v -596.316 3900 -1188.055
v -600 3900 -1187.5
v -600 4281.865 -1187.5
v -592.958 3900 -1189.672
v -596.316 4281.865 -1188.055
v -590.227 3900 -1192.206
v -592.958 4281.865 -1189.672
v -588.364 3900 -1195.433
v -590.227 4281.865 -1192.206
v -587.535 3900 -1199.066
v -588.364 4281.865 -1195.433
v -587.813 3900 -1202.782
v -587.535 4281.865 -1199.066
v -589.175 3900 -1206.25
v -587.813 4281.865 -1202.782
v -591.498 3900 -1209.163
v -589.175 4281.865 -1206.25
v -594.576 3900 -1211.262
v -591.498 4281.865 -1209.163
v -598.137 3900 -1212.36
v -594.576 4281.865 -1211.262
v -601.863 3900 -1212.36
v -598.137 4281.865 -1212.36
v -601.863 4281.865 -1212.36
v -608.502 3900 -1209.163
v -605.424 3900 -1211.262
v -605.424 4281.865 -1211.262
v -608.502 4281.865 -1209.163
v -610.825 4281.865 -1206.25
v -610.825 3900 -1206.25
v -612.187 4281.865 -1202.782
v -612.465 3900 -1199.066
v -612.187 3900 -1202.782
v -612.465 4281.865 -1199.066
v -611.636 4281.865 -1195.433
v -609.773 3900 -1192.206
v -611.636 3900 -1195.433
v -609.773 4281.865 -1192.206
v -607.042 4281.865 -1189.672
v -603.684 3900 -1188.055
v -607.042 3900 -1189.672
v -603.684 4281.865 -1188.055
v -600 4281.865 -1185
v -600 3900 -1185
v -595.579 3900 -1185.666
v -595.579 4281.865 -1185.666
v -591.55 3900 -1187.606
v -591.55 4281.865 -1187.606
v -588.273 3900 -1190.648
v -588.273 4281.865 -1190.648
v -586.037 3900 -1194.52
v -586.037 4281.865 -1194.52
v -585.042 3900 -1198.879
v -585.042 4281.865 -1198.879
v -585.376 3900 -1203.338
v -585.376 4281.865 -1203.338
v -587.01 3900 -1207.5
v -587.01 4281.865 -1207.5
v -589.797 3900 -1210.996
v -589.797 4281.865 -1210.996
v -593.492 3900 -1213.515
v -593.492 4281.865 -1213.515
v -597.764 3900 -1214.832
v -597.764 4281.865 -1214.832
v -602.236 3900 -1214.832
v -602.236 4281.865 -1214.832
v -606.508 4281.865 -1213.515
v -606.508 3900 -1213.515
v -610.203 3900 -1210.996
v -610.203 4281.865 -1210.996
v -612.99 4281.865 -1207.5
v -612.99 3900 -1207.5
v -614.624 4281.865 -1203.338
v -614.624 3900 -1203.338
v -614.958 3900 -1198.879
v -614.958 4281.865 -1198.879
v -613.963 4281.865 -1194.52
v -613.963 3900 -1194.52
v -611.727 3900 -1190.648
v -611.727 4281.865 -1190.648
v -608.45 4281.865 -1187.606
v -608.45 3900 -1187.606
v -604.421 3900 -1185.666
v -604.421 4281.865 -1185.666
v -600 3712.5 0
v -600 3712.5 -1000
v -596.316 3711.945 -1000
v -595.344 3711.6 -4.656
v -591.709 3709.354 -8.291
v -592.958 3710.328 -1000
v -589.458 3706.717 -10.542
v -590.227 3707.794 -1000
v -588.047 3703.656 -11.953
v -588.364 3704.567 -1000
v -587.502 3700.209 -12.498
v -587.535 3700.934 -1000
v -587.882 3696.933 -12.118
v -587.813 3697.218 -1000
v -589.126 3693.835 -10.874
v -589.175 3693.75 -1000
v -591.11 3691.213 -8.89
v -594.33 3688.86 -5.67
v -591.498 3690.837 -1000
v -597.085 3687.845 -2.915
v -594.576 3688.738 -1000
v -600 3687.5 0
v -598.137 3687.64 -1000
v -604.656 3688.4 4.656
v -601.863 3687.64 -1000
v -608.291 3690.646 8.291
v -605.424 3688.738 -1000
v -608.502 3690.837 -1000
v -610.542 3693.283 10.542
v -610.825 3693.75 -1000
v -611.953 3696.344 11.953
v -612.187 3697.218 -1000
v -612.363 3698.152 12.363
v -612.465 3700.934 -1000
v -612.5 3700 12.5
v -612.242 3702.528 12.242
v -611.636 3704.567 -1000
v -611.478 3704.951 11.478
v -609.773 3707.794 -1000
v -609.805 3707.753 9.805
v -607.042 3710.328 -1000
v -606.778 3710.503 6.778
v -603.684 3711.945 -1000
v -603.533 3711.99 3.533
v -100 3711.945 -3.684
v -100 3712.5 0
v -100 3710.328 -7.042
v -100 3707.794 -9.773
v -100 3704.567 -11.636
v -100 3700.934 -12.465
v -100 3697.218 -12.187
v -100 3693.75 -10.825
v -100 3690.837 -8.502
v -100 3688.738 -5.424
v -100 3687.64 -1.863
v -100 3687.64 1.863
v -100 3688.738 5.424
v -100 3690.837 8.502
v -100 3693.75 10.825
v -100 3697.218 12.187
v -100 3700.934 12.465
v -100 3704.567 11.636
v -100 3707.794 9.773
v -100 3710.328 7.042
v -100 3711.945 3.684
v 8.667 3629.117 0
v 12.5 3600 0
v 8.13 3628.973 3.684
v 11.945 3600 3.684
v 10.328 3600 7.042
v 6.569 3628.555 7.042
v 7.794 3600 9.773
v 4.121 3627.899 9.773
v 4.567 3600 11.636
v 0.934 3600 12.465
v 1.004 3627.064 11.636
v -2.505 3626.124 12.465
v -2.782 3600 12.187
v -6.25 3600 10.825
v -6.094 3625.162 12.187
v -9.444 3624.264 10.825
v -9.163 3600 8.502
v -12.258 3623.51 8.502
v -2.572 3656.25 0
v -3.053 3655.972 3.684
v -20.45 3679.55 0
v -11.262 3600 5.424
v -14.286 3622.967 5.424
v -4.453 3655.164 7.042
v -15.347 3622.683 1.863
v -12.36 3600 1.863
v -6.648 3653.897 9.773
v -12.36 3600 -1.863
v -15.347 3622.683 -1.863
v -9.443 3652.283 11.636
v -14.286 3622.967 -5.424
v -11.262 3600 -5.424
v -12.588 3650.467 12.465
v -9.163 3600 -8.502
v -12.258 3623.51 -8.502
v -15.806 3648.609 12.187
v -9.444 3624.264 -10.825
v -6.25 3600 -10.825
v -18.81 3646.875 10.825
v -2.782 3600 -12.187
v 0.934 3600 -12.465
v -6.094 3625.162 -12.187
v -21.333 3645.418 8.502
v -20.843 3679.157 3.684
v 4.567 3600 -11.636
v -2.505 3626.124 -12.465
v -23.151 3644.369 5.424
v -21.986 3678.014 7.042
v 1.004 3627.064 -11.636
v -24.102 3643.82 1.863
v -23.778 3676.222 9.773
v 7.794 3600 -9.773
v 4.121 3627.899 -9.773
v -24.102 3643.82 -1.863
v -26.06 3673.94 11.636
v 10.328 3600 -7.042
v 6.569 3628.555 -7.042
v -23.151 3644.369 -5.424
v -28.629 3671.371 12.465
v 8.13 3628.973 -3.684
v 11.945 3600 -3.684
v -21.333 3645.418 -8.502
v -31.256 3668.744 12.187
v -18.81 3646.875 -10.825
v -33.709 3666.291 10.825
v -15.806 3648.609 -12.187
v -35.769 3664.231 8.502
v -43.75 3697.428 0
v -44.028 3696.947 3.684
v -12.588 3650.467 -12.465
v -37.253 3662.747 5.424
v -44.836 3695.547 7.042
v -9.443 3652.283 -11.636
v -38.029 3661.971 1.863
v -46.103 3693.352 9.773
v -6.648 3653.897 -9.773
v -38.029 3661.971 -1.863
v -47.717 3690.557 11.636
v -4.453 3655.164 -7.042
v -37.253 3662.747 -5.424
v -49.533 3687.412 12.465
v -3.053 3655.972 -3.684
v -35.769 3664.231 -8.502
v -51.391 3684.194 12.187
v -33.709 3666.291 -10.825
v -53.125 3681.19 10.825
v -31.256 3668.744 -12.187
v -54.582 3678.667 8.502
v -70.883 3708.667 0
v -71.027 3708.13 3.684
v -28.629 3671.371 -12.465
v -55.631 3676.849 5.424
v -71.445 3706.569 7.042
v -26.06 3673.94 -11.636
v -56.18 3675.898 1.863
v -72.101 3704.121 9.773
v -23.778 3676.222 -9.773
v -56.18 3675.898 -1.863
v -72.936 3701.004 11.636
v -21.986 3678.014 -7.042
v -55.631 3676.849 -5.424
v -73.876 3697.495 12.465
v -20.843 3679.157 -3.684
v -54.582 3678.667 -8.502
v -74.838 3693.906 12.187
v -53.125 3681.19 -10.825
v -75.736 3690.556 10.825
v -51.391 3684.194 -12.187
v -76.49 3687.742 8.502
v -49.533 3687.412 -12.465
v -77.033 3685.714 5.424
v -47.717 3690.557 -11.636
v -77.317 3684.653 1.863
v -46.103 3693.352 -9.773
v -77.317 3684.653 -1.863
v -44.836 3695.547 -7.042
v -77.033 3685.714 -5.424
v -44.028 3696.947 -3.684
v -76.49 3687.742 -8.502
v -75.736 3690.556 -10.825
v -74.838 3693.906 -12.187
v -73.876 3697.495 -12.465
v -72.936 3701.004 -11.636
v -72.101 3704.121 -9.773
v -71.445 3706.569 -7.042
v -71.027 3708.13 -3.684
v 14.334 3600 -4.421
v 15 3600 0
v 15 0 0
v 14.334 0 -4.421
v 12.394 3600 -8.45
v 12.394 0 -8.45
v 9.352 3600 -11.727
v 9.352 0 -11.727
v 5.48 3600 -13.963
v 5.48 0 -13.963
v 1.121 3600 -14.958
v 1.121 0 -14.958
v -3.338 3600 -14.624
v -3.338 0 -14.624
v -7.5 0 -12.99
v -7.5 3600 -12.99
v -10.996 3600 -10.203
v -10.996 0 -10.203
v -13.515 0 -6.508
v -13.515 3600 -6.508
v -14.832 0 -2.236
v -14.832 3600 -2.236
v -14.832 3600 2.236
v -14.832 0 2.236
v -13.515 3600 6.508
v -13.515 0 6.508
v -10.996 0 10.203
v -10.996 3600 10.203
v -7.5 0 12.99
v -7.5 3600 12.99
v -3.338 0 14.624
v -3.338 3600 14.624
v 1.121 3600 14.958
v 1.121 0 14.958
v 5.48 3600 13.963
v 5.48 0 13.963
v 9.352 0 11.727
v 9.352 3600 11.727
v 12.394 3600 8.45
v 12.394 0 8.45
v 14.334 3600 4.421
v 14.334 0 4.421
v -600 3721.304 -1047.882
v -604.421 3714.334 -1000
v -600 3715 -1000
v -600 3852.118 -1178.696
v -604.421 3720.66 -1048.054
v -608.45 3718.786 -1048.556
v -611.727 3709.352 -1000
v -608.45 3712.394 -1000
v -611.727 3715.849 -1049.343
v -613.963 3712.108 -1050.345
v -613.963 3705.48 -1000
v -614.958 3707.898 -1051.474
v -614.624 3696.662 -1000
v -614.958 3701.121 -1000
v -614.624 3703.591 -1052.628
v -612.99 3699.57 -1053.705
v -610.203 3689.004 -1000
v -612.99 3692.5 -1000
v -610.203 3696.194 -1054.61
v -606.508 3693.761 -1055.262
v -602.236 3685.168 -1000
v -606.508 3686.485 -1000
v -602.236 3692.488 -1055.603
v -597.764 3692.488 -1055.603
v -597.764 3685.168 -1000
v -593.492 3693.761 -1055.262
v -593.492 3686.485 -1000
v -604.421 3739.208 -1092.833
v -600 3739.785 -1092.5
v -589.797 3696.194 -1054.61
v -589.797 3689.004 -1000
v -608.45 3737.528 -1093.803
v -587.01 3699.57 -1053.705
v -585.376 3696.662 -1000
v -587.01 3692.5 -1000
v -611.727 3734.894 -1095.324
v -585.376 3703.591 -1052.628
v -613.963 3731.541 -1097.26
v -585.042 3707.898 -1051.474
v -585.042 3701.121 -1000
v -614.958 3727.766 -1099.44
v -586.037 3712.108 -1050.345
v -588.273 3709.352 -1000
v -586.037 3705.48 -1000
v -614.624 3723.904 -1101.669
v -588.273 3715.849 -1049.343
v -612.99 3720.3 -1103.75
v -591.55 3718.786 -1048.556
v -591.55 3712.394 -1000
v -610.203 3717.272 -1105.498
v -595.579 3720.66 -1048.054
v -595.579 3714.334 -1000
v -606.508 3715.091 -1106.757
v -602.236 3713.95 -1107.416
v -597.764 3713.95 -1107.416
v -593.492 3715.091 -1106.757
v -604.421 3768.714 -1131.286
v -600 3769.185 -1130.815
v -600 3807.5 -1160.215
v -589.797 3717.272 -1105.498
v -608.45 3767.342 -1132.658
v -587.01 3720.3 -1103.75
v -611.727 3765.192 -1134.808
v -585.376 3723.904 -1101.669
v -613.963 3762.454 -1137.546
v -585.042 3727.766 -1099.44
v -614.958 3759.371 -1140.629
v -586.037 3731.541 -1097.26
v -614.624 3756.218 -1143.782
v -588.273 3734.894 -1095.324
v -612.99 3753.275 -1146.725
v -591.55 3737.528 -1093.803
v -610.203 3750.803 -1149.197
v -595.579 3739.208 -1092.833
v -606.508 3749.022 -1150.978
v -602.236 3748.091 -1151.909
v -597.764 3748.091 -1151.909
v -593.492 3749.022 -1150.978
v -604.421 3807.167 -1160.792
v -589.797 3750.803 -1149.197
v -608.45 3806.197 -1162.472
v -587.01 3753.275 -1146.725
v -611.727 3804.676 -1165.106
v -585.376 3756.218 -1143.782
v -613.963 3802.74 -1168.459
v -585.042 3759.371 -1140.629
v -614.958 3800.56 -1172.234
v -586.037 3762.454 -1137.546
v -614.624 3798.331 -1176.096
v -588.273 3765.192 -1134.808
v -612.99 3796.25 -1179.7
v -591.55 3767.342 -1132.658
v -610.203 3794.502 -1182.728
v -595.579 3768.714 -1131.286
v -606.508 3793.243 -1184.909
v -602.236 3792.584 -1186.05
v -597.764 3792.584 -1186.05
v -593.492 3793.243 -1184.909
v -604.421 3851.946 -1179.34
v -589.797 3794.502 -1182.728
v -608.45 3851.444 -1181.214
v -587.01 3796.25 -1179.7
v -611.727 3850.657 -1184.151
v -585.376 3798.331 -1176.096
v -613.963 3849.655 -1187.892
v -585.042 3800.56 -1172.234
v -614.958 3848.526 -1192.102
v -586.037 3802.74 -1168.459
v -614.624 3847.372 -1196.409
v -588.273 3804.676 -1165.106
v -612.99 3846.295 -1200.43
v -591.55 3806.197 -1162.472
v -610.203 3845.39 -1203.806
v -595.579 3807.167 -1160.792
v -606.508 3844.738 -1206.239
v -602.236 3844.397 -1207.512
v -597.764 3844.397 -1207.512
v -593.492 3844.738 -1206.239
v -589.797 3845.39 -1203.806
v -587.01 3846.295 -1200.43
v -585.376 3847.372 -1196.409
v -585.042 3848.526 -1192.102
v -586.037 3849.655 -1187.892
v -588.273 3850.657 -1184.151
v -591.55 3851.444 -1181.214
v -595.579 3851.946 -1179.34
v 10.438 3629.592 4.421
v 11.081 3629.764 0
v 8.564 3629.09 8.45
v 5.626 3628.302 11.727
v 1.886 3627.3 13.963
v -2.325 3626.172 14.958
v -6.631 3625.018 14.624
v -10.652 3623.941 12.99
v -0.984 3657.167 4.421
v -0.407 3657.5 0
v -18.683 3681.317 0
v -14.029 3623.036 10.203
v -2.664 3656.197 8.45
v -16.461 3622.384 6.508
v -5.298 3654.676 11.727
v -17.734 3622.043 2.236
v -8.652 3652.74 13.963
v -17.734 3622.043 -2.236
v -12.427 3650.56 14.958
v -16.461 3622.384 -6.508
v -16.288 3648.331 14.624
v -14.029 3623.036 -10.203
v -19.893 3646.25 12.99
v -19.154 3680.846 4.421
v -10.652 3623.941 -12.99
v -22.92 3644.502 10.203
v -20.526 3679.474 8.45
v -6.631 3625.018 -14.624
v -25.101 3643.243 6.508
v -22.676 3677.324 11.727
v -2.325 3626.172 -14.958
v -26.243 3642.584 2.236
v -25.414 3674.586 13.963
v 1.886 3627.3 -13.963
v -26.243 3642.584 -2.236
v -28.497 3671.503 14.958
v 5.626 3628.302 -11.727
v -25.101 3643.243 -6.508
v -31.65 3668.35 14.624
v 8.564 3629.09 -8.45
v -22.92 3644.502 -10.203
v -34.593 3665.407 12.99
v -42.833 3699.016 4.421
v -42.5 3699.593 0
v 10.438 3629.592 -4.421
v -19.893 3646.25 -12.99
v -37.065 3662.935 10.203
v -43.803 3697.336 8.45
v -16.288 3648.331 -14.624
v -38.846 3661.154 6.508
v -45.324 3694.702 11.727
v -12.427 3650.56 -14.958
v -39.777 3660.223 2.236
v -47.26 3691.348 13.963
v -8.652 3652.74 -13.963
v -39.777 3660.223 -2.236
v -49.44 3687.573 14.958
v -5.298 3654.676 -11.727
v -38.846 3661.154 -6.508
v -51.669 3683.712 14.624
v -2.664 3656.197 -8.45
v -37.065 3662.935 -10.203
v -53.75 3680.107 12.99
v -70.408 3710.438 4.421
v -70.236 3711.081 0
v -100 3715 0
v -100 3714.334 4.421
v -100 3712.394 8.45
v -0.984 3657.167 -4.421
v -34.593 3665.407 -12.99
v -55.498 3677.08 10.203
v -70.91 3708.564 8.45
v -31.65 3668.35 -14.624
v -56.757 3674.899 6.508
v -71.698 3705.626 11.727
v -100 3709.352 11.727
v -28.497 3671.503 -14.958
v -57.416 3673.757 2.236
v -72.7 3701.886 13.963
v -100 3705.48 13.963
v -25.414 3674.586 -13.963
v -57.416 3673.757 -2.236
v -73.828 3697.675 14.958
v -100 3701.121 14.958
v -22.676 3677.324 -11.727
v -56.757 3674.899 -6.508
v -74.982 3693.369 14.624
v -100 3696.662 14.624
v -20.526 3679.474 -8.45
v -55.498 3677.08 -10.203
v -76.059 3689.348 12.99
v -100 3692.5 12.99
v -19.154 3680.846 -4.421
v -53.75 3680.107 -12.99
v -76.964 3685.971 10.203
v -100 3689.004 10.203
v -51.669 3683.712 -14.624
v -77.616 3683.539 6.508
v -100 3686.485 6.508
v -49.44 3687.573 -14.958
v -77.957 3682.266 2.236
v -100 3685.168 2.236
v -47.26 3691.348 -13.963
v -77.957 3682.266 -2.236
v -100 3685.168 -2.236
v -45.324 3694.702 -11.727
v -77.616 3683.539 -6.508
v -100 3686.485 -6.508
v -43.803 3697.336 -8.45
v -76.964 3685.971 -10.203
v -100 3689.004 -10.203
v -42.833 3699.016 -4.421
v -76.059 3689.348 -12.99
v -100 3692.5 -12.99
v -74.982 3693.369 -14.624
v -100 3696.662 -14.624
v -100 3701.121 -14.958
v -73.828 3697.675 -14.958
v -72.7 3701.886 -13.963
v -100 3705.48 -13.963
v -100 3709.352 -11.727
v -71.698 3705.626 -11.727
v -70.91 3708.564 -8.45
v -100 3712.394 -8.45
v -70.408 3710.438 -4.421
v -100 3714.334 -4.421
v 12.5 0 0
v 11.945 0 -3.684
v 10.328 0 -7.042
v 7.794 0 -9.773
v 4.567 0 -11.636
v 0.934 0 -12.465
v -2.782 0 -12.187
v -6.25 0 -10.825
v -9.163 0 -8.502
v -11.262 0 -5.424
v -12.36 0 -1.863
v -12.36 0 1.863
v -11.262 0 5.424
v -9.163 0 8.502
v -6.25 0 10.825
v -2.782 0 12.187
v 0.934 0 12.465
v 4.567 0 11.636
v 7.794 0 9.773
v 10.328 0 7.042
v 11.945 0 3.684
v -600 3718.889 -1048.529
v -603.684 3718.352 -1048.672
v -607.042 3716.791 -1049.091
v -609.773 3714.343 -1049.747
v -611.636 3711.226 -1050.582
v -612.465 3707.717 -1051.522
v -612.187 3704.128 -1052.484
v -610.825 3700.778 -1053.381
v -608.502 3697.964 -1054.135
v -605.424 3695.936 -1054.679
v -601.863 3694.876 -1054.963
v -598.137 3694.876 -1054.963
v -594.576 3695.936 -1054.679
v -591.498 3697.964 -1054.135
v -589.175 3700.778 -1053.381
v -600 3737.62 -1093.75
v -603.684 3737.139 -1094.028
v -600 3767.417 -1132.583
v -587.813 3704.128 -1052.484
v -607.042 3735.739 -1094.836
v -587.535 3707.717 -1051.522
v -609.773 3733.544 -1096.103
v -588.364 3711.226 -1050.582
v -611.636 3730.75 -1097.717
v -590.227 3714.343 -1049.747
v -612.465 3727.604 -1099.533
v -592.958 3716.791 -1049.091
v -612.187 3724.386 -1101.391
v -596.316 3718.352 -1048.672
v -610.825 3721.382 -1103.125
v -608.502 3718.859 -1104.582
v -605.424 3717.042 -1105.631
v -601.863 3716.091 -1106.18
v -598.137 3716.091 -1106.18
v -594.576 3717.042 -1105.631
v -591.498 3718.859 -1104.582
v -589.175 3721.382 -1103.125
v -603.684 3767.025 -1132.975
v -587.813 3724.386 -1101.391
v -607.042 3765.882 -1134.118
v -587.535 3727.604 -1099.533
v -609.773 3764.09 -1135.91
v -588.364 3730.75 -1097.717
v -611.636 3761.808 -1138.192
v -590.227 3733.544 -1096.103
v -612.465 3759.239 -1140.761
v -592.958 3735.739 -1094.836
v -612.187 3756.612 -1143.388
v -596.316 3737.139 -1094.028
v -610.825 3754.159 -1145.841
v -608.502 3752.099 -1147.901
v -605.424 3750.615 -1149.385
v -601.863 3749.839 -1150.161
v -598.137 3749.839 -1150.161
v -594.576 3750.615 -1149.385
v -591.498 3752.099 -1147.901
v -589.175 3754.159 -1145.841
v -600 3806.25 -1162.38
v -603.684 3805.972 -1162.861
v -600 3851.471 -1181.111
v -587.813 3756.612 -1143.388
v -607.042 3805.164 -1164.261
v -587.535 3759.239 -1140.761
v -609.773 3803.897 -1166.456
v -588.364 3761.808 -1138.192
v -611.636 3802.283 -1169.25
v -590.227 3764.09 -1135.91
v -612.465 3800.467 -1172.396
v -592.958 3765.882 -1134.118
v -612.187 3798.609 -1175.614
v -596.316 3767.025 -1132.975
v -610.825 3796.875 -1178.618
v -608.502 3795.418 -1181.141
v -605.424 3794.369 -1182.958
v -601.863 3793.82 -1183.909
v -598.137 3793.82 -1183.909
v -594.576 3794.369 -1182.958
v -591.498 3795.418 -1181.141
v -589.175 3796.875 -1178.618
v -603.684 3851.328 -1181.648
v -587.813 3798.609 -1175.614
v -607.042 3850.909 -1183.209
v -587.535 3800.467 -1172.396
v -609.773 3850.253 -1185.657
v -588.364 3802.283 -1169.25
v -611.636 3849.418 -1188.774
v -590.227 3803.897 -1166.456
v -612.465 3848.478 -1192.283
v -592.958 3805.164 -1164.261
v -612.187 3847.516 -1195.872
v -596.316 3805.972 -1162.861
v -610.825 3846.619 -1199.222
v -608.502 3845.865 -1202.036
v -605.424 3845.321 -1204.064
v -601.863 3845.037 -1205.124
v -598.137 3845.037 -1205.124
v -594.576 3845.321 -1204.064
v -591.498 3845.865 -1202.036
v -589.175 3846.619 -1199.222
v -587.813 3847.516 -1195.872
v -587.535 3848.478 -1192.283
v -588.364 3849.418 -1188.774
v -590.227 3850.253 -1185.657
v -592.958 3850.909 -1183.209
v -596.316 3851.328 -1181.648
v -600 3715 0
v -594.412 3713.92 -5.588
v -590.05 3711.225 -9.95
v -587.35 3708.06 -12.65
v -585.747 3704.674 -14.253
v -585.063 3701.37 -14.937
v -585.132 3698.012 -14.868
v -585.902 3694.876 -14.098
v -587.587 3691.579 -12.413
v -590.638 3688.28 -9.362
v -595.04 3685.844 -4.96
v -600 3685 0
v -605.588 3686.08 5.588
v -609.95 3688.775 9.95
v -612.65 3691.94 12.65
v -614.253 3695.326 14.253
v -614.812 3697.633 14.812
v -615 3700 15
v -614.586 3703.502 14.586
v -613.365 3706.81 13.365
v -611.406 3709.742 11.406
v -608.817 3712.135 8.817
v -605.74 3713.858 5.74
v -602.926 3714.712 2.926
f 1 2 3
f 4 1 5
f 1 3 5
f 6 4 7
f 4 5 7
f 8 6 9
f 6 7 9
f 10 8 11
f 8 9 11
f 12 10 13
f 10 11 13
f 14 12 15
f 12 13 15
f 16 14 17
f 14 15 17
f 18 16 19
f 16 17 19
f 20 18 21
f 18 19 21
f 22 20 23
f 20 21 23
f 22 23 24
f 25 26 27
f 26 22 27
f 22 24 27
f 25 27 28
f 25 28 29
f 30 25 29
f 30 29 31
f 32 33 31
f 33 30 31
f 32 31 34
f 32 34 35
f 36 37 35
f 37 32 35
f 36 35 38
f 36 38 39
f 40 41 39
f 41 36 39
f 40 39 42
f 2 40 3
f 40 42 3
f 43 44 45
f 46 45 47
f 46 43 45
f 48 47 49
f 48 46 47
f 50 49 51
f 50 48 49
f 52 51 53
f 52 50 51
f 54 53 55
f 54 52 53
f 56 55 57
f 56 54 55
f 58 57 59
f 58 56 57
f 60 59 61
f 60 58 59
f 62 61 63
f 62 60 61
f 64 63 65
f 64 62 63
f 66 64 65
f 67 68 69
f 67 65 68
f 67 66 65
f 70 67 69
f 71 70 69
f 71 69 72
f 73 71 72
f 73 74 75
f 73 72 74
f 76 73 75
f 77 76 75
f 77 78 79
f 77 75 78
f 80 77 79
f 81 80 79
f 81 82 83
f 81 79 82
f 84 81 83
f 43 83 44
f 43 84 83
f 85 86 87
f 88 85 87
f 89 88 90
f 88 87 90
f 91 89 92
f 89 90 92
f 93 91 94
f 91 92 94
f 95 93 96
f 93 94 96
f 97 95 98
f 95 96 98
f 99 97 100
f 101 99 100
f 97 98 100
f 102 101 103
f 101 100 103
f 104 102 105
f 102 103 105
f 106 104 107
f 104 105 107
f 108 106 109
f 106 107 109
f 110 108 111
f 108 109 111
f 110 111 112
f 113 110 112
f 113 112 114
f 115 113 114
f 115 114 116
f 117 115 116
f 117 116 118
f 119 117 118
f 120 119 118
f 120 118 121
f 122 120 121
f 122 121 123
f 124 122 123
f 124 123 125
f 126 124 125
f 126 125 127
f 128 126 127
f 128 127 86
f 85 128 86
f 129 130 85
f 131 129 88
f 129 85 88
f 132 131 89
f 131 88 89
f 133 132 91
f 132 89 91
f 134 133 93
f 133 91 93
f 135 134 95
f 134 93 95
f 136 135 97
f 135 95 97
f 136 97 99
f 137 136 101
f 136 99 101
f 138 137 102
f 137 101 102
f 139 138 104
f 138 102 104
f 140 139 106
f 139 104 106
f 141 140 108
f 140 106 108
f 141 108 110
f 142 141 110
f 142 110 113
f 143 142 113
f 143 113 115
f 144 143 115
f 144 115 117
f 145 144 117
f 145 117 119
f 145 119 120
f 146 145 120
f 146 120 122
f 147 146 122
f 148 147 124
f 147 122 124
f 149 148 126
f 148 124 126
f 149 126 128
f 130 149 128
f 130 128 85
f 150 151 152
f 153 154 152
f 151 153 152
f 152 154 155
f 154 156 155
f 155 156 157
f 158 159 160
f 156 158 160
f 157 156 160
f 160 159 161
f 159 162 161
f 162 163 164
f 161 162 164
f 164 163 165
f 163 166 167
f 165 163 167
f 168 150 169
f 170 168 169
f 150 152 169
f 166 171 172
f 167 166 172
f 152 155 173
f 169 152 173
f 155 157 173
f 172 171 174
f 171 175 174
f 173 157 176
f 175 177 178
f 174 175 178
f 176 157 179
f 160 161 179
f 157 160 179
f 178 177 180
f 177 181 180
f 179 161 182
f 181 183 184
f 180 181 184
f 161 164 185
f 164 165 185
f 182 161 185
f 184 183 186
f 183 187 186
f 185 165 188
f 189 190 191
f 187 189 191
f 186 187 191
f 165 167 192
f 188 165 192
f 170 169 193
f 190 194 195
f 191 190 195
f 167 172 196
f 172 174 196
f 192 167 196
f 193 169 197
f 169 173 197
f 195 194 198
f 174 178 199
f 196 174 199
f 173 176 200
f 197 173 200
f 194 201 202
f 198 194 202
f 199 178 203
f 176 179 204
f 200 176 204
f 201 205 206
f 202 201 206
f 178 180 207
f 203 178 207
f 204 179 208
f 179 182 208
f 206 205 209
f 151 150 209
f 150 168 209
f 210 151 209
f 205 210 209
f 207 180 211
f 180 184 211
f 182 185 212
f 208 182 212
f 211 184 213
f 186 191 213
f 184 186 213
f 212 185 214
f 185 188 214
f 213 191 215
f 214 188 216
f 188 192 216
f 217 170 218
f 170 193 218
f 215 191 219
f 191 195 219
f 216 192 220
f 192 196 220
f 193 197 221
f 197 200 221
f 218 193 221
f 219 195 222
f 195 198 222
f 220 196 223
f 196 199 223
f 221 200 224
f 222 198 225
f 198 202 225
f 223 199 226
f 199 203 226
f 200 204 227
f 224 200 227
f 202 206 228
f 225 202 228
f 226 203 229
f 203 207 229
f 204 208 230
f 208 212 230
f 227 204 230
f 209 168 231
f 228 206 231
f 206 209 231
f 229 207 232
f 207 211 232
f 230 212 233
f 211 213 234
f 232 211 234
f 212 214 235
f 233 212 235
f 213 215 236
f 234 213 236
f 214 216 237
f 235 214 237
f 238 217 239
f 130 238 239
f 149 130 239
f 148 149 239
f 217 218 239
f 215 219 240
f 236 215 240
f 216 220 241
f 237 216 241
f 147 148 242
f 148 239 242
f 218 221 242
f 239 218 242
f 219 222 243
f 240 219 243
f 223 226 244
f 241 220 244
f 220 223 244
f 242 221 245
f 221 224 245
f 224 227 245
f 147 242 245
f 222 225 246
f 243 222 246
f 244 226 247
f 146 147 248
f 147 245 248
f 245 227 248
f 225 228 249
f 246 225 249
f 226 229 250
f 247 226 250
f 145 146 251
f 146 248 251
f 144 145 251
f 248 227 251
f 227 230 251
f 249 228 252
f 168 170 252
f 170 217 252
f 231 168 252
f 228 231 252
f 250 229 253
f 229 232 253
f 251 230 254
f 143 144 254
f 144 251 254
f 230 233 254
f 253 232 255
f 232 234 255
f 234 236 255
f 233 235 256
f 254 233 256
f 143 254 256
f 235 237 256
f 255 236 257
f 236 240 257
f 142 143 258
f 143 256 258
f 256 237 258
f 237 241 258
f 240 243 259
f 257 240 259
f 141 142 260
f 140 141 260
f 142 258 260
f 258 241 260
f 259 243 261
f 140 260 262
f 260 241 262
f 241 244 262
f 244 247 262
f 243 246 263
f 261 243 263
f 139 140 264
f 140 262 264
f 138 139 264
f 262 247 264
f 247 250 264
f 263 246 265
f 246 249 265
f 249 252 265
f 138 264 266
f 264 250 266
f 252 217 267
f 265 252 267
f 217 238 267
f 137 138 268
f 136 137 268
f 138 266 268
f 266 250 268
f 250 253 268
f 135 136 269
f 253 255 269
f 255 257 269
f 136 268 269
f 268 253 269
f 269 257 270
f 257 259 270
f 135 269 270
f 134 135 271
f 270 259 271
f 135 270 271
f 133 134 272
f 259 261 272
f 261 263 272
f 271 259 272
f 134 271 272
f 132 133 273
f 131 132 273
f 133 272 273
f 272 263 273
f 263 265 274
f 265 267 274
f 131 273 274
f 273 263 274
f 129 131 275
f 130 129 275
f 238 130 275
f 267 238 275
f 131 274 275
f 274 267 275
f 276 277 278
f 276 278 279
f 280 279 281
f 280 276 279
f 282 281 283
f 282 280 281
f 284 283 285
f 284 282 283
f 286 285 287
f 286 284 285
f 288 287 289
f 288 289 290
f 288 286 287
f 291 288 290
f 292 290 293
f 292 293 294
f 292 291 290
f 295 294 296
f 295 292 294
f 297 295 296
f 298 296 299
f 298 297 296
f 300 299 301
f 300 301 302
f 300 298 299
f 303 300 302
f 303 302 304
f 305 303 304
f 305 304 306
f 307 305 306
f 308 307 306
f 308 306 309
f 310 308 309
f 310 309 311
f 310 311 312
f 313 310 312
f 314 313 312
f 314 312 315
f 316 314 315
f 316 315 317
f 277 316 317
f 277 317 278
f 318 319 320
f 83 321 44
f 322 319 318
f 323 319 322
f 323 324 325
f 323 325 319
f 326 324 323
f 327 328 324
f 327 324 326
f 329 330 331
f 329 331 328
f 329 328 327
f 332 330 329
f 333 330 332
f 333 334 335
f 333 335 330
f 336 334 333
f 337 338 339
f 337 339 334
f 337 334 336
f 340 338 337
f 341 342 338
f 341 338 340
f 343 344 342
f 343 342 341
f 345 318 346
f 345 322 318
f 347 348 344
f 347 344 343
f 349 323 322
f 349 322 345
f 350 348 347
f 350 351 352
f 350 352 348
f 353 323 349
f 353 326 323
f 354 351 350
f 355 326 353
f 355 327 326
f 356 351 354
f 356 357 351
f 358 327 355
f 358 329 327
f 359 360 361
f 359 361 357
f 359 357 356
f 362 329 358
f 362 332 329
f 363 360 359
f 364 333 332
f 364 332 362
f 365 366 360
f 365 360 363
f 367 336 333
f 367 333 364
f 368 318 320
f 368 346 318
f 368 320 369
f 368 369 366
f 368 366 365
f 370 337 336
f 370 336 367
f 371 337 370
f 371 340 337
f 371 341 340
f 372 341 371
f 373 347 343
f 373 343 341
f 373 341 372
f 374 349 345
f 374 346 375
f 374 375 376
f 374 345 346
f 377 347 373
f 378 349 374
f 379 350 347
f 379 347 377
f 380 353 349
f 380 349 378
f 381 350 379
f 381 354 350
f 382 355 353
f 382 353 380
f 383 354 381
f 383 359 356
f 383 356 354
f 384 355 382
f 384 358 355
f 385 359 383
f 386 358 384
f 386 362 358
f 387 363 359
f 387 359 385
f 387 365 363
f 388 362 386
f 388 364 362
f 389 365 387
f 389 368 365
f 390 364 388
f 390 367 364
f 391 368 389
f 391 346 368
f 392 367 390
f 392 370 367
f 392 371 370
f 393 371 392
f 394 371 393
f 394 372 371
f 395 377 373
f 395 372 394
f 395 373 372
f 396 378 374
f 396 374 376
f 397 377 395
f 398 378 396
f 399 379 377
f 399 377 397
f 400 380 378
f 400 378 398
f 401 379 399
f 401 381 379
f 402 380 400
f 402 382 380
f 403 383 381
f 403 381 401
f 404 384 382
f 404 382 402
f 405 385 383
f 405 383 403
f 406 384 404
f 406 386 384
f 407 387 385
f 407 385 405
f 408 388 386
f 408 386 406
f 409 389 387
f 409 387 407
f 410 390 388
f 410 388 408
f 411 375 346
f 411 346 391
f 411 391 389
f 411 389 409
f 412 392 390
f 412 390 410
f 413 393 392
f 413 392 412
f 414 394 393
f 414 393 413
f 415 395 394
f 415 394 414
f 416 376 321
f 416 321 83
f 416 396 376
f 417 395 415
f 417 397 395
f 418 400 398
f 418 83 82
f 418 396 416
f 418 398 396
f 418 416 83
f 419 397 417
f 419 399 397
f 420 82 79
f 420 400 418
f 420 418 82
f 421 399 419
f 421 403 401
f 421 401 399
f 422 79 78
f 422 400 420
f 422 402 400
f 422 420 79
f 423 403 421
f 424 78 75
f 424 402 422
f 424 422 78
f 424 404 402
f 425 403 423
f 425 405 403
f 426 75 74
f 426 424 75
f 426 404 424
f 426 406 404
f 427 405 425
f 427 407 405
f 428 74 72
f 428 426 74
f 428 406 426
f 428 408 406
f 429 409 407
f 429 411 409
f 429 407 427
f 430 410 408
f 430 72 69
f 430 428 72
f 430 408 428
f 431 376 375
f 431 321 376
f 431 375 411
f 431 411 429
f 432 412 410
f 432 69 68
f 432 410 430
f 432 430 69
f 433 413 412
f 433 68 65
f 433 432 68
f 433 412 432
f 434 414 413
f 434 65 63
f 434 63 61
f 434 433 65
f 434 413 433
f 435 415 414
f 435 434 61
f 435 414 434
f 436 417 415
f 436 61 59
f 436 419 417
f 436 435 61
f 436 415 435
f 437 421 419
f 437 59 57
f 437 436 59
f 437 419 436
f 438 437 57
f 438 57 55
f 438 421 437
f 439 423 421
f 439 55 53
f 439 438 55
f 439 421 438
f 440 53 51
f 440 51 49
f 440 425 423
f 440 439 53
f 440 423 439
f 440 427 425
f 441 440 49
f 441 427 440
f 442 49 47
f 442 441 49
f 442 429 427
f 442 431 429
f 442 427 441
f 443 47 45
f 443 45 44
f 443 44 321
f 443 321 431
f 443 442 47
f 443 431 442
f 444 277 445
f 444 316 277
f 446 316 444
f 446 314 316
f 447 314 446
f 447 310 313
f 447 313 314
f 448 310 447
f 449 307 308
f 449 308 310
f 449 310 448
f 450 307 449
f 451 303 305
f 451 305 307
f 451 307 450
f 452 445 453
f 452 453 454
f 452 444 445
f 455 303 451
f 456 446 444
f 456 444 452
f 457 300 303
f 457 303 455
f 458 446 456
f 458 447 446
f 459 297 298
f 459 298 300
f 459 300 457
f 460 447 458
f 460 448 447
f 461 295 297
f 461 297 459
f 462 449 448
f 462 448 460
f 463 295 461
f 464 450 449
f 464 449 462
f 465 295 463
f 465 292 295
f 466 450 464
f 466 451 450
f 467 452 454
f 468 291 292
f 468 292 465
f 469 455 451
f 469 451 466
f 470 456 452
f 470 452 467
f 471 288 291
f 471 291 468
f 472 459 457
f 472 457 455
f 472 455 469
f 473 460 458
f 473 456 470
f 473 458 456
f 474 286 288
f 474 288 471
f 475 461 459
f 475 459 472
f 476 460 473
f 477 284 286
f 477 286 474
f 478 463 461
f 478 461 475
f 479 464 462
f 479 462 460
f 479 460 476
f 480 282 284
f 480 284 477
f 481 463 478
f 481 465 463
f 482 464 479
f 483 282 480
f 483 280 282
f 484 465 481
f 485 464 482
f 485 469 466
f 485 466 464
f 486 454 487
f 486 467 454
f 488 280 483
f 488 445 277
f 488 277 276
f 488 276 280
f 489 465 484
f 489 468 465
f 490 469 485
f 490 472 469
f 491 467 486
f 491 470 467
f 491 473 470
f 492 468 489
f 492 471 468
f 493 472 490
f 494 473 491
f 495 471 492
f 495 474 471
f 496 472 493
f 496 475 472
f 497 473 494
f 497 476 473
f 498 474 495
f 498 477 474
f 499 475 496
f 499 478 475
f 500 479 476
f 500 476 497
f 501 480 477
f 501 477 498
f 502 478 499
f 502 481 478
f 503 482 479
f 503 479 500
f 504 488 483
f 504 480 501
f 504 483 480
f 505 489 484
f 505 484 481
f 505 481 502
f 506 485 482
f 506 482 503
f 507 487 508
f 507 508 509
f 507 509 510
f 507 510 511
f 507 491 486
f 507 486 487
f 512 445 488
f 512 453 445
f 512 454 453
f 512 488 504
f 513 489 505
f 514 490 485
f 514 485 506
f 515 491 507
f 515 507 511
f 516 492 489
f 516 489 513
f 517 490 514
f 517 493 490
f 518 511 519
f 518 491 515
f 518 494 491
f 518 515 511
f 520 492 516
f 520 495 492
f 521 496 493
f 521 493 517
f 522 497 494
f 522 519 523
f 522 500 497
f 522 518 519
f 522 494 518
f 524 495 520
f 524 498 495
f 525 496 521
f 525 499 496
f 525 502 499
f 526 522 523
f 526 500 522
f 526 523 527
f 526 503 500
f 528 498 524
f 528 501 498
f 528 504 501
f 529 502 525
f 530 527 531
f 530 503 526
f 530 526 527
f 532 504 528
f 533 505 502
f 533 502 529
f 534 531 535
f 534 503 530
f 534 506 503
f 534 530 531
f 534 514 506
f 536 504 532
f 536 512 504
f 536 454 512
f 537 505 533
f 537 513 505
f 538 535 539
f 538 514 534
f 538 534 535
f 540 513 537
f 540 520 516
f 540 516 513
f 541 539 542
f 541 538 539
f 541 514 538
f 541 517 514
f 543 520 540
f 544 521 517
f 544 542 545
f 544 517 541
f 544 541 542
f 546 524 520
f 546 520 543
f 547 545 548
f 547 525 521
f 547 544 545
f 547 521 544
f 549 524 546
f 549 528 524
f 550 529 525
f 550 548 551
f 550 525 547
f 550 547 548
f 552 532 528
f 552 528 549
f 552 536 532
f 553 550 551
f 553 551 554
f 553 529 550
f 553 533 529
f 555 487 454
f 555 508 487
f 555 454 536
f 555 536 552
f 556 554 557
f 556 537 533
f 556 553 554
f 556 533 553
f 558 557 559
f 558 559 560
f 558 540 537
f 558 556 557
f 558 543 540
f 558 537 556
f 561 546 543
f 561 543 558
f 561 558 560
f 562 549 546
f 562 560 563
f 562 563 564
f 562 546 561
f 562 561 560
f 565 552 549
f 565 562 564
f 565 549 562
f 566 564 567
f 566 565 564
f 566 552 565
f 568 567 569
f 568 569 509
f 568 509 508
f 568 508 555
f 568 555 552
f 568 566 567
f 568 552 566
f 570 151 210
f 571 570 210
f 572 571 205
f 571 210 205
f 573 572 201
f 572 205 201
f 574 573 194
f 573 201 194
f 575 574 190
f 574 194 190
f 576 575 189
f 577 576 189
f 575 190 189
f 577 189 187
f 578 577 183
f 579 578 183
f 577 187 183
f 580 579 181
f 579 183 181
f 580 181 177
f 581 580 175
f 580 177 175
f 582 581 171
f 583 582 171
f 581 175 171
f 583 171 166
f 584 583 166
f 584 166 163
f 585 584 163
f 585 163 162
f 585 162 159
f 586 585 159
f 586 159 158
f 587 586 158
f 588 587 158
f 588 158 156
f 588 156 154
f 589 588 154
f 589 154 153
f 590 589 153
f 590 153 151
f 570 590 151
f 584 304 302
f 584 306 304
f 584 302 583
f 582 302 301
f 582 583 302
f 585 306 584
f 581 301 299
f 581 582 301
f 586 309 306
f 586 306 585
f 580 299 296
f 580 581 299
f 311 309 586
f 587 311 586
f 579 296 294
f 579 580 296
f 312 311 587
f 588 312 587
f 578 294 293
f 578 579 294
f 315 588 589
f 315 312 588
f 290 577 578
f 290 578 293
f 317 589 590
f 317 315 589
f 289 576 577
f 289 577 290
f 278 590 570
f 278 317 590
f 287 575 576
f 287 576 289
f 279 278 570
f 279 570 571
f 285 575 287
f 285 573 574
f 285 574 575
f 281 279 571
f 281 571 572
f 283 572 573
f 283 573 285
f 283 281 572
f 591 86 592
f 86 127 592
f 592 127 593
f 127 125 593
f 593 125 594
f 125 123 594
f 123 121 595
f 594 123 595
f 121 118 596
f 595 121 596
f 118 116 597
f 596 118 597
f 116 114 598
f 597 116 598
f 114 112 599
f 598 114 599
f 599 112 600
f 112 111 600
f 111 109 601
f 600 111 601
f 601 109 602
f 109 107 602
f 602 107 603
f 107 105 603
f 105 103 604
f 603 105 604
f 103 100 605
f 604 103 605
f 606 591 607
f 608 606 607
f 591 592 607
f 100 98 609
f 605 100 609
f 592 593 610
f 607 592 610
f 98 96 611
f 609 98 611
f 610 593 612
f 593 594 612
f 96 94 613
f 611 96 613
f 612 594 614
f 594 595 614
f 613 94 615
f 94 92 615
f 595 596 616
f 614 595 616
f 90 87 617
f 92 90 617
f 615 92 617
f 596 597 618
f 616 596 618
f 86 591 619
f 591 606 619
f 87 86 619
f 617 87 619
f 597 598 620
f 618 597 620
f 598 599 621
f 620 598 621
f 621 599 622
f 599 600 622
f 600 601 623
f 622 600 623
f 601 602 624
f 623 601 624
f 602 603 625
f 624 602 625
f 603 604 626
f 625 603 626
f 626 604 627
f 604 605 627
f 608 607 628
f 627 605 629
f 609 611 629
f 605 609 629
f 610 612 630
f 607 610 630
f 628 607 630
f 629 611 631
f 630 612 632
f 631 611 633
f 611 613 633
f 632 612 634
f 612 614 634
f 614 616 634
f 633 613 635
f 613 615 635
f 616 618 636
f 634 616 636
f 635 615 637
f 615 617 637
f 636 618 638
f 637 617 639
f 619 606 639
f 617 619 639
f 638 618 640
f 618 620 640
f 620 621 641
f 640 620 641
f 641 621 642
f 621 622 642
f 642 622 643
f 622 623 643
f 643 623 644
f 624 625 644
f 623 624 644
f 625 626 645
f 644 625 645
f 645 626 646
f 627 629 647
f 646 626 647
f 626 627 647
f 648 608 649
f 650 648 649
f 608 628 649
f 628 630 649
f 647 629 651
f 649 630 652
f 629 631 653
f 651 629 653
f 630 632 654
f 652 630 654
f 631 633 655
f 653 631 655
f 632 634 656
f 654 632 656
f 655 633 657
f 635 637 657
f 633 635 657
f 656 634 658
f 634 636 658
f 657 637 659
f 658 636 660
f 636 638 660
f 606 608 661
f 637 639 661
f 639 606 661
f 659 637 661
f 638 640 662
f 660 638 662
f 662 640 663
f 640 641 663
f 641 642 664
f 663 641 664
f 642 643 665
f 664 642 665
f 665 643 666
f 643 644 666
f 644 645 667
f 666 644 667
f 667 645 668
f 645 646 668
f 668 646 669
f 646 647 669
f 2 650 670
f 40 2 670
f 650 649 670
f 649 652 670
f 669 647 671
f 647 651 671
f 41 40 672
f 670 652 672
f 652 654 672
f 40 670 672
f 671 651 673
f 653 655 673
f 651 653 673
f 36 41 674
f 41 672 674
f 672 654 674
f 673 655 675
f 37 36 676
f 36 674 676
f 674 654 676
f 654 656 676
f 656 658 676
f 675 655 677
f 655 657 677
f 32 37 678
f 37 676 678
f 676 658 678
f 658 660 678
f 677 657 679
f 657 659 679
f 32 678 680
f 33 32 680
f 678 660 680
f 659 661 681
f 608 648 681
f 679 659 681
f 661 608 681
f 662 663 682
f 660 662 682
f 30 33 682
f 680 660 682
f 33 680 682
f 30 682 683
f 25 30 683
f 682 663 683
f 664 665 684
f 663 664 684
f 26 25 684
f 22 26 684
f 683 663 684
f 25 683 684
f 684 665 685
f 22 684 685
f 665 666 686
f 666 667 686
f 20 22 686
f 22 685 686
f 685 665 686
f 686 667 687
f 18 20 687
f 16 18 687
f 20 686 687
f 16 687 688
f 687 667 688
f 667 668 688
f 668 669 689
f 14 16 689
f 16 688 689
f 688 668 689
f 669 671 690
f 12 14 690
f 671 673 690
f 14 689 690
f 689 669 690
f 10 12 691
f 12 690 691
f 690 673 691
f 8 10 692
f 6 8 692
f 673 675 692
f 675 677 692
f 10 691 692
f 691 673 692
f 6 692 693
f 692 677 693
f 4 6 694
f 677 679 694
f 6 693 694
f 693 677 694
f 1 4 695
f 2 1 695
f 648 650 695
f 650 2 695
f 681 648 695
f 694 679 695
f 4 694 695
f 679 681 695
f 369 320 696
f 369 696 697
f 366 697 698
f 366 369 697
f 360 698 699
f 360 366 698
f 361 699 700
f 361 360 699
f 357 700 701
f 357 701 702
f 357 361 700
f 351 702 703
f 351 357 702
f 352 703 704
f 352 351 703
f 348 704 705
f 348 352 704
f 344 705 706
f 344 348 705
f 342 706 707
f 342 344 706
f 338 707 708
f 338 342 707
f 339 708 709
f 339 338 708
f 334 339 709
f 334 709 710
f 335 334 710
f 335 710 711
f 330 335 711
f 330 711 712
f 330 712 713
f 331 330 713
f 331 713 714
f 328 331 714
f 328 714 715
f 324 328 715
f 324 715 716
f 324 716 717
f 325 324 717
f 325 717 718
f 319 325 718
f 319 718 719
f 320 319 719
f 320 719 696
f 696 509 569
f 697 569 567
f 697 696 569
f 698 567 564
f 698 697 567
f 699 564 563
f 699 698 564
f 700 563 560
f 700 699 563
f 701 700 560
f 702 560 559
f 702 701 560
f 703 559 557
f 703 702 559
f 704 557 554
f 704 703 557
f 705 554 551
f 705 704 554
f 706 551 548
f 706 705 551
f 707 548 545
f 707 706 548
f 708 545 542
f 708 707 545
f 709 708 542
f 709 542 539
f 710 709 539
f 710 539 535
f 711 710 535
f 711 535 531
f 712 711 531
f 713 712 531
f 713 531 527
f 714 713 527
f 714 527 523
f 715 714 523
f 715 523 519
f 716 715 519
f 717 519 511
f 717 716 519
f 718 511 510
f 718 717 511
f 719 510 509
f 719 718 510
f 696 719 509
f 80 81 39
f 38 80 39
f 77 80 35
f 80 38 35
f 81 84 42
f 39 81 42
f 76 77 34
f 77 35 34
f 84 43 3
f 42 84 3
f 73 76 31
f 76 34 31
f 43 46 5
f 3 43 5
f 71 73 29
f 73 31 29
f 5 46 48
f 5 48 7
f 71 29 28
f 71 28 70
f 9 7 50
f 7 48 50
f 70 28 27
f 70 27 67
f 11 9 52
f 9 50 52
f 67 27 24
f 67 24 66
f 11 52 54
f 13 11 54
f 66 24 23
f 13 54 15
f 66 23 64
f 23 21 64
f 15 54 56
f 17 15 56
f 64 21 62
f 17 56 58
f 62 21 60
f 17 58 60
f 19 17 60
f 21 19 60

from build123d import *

# Parameters (mm, degrees)
F0_R   = 15
F0_R_2 = 12.5


with BuildPart() as f4:
    # F4: sweep along a path in F1, F3
    with BuildLine(Plane.XY) as f4_path:
        Line((0, 0), (0, 3600))
        ThreePointArc((0, 3600), (-29.2893218813, 3670.7106781187), (-100, 3700))
        Line((-100, 3700), (-600, 3700))
    with BuildLine(Plane.YZ.offset(-600)) as f4_path_2:
        Line((3700, 0), (3700, -1000))
        ThreePointArc((3700, -1000), (3758.5786437627, -1141.4213562373), (3900, -1200))
        Line((3900, -1200), (4281.8653106689, -1200))
    # F0 (on Front) → F4 (sweep)
    with BuildSketch(Plane.XZ):
        Circle(F0_R)
        Circle(F0_R_2, mode=Mode.SUBTRACT)
    sweep(path=f4_path.line + f4_path_2.line, transition=Transition.RIGHT)


solid = f4.part
